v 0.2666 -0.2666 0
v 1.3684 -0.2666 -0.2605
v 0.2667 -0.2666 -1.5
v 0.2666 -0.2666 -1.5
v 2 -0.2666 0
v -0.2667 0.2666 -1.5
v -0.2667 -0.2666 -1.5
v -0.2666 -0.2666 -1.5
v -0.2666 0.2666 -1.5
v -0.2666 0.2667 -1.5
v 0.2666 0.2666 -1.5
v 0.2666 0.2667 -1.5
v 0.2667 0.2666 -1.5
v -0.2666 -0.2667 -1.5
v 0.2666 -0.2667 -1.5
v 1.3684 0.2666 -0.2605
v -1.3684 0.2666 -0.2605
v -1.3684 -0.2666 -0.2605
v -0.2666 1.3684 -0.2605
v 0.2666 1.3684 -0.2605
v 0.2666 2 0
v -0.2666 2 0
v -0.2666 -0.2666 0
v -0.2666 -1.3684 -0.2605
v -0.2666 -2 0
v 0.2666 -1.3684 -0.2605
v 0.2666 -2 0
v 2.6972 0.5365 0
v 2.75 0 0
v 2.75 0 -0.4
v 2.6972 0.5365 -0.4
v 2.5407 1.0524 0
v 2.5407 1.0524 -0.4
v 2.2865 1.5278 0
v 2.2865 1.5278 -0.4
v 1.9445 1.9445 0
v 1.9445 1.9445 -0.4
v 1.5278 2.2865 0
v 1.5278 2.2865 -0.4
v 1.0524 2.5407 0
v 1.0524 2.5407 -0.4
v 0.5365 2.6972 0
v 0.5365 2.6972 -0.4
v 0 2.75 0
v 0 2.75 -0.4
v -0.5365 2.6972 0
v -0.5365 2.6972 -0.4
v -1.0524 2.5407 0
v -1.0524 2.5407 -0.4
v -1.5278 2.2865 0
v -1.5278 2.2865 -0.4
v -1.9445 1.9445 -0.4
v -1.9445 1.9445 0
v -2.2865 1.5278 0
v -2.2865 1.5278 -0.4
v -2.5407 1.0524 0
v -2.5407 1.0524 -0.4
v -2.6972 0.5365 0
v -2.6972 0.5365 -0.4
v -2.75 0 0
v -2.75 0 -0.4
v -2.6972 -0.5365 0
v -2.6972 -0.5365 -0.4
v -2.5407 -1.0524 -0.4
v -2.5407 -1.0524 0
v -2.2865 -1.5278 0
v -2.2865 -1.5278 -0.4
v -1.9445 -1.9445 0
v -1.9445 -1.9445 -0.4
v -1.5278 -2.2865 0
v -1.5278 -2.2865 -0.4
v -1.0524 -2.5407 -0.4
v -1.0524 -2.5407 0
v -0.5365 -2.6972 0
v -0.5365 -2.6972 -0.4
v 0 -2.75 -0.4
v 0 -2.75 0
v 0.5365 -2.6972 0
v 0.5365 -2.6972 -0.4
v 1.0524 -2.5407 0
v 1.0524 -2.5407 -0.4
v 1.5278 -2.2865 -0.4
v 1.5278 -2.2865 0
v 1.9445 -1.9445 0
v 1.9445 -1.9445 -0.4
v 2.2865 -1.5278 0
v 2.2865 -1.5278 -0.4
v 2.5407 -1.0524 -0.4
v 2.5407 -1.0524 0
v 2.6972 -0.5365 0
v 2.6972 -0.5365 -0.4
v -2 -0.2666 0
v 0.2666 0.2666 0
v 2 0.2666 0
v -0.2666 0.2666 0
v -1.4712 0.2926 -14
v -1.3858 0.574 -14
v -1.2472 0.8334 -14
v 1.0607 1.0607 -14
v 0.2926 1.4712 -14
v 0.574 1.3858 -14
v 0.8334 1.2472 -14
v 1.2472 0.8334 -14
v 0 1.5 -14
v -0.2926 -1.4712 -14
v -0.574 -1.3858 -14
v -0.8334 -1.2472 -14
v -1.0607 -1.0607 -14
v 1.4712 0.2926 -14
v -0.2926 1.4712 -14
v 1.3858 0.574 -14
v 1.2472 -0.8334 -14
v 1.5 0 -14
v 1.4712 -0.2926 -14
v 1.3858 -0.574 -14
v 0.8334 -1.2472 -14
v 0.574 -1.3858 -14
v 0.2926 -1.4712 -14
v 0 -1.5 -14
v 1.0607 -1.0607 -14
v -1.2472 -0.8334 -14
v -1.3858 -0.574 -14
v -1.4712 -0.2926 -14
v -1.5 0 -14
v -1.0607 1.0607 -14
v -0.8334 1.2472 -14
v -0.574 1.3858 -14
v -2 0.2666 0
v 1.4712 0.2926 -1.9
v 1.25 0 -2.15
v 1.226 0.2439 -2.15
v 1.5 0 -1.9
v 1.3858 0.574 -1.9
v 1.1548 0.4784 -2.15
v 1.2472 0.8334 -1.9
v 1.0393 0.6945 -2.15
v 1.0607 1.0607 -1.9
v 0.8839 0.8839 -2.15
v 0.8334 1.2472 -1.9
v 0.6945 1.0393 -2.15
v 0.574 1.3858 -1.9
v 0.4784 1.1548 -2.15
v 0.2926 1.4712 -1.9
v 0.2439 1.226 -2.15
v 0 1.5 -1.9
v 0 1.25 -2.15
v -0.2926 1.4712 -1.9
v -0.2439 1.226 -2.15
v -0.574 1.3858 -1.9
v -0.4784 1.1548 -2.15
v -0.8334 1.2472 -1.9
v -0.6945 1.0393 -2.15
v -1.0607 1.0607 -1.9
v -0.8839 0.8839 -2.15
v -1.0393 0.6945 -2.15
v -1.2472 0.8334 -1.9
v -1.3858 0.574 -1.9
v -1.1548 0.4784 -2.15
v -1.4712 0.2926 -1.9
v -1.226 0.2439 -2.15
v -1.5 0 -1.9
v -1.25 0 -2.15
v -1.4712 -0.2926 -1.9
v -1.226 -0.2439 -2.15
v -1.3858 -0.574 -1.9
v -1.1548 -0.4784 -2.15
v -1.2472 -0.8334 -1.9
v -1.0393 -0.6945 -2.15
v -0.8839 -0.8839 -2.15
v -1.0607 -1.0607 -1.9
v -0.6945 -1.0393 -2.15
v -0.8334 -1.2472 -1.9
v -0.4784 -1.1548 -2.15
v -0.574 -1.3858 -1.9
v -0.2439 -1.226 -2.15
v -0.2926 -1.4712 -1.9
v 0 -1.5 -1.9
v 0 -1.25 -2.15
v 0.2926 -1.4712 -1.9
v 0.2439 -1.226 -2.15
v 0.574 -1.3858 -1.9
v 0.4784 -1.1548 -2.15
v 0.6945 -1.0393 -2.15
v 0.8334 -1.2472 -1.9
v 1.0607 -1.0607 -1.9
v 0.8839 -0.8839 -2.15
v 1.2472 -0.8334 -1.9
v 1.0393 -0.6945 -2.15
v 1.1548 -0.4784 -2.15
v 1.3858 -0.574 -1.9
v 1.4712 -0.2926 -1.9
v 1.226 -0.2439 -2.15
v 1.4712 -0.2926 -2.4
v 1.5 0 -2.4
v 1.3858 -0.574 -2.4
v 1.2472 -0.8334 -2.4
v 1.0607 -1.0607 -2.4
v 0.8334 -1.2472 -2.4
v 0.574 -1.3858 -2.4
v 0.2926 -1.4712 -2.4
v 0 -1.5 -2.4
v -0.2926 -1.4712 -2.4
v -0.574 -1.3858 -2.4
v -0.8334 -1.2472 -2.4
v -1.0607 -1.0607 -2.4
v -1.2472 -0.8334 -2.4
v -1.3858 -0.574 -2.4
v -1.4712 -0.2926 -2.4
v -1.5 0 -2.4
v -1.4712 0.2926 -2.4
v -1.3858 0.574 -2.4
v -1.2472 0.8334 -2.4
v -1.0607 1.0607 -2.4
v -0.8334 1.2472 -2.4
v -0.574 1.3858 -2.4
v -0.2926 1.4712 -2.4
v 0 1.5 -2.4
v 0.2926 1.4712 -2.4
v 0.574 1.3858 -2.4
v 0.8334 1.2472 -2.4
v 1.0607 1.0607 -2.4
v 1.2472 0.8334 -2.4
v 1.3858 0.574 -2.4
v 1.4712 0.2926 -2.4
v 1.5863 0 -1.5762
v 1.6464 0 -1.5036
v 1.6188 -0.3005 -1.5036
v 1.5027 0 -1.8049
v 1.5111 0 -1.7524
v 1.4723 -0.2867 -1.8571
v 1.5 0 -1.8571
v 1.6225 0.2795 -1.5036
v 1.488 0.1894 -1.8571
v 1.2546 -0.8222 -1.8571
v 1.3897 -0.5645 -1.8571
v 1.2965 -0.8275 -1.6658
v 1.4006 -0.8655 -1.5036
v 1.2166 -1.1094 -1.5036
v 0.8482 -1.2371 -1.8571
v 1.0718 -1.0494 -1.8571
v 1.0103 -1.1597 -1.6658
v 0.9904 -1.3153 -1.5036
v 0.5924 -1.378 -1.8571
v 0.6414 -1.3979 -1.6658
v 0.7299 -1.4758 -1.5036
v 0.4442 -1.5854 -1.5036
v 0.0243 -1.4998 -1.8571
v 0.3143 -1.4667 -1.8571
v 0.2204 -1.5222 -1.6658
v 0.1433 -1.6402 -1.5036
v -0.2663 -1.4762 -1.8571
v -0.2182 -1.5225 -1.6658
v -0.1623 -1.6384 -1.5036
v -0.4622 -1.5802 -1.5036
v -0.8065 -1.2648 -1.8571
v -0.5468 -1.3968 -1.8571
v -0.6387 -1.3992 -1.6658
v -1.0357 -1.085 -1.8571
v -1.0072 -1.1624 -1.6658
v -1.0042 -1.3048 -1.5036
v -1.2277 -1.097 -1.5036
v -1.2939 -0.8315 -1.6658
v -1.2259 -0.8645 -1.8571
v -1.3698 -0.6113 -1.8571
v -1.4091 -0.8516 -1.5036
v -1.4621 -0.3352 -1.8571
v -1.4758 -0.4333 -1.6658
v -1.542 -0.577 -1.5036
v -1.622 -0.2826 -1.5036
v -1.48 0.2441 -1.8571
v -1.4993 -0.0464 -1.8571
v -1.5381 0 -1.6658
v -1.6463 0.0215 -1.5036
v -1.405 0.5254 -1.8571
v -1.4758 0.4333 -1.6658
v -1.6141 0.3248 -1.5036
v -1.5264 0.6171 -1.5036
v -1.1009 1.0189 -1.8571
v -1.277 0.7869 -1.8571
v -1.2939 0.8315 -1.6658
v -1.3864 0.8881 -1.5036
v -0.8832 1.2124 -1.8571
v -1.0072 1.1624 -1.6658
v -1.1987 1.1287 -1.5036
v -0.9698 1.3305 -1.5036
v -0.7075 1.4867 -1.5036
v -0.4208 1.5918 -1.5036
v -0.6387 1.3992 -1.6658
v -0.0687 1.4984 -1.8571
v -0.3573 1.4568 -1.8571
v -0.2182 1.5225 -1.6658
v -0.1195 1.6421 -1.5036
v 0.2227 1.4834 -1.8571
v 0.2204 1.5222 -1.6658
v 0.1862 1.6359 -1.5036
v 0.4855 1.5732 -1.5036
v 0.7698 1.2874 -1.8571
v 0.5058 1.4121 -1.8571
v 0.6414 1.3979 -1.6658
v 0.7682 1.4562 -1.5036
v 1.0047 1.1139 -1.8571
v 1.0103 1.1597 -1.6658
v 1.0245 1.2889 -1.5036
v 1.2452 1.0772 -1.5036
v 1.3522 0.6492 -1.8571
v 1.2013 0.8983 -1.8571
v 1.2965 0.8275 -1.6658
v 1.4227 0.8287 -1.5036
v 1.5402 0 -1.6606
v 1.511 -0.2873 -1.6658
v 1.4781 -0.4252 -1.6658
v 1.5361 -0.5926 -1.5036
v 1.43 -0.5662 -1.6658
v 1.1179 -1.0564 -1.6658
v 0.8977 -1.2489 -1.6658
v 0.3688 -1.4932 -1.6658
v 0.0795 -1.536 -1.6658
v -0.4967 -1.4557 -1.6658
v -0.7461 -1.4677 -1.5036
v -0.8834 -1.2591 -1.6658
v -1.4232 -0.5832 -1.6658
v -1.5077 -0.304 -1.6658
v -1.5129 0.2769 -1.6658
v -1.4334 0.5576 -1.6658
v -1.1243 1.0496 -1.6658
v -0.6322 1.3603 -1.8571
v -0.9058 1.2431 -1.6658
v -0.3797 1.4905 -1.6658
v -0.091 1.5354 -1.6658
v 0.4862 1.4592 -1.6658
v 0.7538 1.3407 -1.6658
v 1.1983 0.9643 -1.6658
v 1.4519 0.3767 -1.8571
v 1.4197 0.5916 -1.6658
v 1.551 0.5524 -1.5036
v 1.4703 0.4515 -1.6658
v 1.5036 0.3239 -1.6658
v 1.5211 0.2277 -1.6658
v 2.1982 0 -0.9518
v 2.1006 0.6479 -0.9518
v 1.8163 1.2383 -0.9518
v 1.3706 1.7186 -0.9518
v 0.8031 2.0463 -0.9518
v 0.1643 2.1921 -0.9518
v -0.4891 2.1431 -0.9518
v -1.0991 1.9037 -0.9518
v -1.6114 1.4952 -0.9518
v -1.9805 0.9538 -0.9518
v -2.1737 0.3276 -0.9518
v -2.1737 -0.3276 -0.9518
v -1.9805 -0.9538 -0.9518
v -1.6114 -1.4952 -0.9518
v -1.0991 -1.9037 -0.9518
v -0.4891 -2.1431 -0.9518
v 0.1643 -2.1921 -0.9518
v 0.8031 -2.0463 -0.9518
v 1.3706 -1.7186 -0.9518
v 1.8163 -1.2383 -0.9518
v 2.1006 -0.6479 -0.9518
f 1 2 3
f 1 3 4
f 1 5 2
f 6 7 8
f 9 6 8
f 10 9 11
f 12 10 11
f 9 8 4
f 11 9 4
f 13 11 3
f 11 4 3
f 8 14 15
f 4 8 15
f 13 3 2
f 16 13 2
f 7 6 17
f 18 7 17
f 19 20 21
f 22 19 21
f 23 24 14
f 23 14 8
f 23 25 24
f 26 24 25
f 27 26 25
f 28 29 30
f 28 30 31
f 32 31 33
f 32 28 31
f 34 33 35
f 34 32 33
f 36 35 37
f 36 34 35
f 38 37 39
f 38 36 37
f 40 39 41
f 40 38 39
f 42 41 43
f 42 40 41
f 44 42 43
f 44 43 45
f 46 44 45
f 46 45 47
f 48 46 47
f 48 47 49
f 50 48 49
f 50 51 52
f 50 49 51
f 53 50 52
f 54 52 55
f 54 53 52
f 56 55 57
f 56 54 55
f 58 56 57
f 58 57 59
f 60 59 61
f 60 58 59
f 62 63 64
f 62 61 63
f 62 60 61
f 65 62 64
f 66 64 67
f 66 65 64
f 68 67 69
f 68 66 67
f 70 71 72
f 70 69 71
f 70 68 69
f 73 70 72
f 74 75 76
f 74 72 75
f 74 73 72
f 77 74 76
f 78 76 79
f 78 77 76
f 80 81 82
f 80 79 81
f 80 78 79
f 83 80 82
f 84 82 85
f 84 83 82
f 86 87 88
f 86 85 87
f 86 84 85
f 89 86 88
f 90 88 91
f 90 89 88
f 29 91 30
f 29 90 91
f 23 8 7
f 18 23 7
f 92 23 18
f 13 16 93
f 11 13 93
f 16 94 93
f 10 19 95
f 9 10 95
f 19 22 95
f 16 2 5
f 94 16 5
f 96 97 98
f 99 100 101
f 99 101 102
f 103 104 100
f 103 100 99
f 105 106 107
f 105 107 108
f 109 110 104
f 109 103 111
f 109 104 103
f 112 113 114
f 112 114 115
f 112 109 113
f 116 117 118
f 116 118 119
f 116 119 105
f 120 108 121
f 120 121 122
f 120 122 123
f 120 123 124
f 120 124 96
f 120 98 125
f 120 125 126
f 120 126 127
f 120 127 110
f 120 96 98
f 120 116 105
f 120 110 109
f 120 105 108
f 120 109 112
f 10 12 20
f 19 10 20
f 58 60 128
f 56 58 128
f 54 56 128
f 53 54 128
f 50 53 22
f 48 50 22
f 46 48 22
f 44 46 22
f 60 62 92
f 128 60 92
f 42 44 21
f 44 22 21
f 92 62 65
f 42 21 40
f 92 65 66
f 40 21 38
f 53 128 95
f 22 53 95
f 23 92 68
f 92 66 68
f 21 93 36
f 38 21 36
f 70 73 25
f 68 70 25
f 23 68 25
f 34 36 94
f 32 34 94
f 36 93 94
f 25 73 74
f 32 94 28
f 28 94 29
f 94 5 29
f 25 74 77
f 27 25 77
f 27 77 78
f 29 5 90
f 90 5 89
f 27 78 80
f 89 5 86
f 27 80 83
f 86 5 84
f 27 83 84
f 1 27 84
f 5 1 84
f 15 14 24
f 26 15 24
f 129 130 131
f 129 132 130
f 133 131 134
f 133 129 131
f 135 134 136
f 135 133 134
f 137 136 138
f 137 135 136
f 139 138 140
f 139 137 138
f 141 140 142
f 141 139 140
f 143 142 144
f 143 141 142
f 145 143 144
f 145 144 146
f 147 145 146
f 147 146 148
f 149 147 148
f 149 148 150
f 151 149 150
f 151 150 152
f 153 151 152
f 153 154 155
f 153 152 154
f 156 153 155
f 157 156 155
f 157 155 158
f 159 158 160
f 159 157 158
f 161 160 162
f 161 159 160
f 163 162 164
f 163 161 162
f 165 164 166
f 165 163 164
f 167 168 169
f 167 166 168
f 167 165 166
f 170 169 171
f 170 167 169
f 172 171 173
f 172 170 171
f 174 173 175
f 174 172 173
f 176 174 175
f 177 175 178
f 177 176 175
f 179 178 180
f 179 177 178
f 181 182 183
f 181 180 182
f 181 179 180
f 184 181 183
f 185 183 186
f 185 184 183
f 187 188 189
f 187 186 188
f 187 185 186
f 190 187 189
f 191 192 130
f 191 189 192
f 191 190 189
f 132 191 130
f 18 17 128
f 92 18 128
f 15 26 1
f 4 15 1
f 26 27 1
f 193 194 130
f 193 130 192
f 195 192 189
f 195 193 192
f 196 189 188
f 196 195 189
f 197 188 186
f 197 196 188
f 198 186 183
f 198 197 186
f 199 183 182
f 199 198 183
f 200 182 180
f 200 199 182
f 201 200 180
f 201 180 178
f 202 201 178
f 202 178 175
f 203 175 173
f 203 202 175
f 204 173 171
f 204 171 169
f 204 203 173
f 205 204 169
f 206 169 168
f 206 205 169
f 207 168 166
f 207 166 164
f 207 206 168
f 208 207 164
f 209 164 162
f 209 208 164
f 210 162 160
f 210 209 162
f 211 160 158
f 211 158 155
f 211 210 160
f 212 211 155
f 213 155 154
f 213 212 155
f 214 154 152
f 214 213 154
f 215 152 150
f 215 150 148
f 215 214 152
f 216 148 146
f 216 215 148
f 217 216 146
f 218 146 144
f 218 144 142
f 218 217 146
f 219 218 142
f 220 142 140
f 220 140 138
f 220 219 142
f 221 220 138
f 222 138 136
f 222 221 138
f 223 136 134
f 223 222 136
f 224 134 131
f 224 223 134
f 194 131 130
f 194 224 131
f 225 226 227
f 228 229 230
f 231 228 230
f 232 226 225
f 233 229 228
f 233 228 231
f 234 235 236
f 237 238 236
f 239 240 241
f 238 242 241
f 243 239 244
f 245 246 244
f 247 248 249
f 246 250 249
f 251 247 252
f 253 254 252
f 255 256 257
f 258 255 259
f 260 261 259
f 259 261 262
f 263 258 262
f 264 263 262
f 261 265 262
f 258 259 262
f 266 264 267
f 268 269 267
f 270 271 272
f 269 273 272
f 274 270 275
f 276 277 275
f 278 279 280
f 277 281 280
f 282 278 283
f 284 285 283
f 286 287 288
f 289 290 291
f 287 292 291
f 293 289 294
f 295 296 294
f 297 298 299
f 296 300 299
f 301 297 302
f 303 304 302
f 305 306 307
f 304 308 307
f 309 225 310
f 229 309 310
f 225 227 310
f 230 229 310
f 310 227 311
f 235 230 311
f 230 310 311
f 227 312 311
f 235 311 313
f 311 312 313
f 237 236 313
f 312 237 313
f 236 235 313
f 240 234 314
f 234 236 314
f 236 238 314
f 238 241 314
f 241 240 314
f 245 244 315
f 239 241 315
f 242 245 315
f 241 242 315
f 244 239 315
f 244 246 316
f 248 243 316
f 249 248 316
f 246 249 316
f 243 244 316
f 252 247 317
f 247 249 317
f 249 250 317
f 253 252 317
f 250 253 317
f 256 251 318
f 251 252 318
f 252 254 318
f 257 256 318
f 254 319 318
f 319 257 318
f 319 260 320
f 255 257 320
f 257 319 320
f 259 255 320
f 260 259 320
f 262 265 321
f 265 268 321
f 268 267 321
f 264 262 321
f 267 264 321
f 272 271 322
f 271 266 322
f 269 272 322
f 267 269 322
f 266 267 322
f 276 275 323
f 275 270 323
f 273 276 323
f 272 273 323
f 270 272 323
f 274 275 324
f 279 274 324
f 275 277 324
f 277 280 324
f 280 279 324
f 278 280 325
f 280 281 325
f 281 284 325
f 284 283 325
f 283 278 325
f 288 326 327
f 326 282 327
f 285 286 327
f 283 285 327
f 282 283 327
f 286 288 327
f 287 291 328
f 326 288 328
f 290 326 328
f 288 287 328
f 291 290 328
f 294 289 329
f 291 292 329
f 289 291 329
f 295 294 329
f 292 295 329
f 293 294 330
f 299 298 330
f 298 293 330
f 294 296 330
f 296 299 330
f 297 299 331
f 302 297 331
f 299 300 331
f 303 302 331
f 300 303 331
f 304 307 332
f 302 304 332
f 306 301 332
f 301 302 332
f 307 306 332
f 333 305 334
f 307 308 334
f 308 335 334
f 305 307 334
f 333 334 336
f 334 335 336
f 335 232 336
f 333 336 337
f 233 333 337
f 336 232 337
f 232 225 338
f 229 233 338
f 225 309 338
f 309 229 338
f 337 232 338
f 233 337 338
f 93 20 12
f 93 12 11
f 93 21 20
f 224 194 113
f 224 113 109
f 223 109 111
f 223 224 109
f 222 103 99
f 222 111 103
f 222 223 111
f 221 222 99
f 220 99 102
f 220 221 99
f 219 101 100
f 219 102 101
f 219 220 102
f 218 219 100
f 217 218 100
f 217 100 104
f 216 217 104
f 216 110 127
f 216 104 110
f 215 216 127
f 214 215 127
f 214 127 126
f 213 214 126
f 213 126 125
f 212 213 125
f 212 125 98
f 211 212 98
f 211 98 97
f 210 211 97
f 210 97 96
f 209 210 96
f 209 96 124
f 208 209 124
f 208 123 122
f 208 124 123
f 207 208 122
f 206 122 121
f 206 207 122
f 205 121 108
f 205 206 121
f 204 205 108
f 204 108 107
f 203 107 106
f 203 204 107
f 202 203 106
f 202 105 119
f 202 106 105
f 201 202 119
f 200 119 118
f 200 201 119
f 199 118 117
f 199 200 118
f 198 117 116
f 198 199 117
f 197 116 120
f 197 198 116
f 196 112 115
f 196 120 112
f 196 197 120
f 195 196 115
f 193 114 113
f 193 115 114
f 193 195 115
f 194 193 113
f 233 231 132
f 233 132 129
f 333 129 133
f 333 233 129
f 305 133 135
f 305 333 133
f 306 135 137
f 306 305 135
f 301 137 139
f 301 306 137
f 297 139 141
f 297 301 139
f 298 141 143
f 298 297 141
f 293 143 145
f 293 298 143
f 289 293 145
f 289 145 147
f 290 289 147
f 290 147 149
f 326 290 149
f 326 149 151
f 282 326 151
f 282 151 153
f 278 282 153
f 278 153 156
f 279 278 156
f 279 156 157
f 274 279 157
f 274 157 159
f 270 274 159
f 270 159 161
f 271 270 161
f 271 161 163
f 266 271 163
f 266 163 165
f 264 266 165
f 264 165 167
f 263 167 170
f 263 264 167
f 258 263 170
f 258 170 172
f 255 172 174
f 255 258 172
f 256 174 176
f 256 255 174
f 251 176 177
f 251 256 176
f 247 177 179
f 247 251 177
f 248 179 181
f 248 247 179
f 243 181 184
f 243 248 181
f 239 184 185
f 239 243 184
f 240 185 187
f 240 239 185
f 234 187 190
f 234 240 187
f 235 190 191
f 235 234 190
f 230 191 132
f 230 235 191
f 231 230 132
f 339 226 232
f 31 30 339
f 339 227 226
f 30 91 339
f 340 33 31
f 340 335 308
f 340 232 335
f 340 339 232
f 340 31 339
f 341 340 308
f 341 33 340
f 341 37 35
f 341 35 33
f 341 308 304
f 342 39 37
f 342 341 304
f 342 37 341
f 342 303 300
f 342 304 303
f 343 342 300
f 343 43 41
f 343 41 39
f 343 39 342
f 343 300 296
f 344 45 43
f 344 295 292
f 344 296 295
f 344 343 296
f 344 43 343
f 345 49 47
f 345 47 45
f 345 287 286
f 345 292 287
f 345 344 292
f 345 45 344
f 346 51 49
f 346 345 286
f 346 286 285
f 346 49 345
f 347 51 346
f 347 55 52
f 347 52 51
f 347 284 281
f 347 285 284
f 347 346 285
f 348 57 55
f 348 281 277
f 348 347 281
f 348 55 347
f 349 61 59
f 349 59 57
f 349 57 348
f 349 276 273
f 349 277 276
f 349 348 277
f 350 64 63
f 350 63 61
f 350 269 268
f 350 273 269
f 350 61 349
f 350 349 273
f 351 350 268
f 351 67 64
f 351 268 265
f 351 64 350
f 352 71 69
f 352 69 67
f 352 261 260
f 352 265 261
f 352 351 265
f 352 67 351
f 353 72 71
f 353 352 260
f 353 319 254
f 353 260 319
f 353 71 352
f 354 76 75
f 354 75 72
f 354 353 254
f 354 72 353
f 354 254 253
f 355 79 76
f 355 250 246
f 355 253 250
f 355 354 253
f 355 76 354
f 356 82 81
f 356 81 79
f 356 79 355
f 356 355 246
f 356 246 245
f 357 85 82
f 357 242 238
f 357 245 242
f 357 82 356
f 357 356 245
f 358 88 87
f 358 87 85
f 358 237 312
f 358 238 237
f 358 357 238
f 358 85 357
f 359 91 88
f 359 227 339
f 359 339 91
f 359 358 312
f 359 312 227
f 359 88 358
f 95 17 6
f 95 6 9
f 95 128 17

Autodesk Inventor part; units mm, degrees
ref_plane "YZ Plane" through (0, 0, 0) normal (1, 0, 0) x (0, 1, 0)
sketch "Esquisse1" plane through (0, 0, 0) normal (0, 1, 0) x (-1, 0, 0)
  point P0 (0, 0)
sketch "Esquisse2" plane through (0, 0, 0) normal (0, 0, 1) x (1, 0, 0)
  point P0 (0, 0)
sketch "Esquisse3" plane through (0, 0, 0) normal (0, 0, 1) x (1, 0, 0)
  point P0 (0, 0)
sketch "Esquisse4" plane through (0, 0, 0) normal (0, 1, 0) x (-1, 0, 0)
  line L0 (-2.75, 0) -> (0, 0)
  line L1 (-2.75, -0.4) -> (-2.75, 0)
  line L2 (-1.5, -1.65) -> (-2.75, -0.4)
  line L3 (-1.5, -1.9) -> (-1.5, -1.65)
  line L4 (-1.25, -2.15) -> (-1.5, -1.9)
  line L5 (-1.5, -2.4) -> (-1.25, -2.15)
  line L6 (-1.5, -14) -> (-1.5, -2.4)
  line L7 (0, 0) -> (0, -14)
  line L8 (0, 3.3392) -> (0, -10.7) construction
  line L9 (0, 3.3392) -> (0, -10.7)
  line L10 (0, -17.4678) -> (0, 6.8071) projected
  line L11 (-1.5, -14) -> (0, -14)
  line L12 (0.55, 0) -> (-3.3, 0) projected
  dimension "d3" = 2.75
  dimension "d5" = 0.25
  dimension "d7" = 0.25
  dimension "d9" = 0.25
  dimension "d11" = 1.65
  dimension "d13" = 135
  dimension "d17" = 1.25
  dimension "d19" = 0
  dimension "d51" = 1.5
  dimension "d52" = 14
revolve "Révolution1" add sketch "Esquisse4" angle 360 about axis through (0, 0, 3.3392) along (0, 0, -1)
sketch "Esquisse5" plane through (0, 0, 0) normal (0, 1, 0) x (-1, 0, 0)
  line L0 (-1.6, 0) -> (0, 0)
  line L1 (-0.2667, -1.5) -> (-1.6, 0)
  line L2 (0, -1.5) -> (-0.2667, -1.5)
  line L3 (0, 0) -> (0, -1.5)
  line L4 (-1.5, -1.65) -> (1.5, -1.65) construction
  line L5 (-2.75, 0) -> (2.75, 0) projected
  line L6 (0, -1.98) -> (0, 0.33) projected
  dimension "d22" = 1.6
  dimension "d24" = 0.2667
  dimension "d26" = 1.5
extrude "Extrusion1" cut sketch "Esquisse5" along normal mid plane 0.5333
pattern_circular "RéseauPolaire1" count 4 over 360 about axis through (0, 0, 0) along (0, 0, 1) of "Extrusion1"
sketch "Esquisse7" plane through (0, 0, 0) normal (0, 1, 0) x (-1, 0, 0)
  line L0 (0, -0.825) -> (-2, 0)
  line L1 (0, 0) -> (0, -0.825)
  line L2 (-2, 0) -> (0, 0)
  line L3 (-1.5, -1.65) -> (1.5, -1.65) construction
  line L4 (0, -1.98) -> (0, 0.33) projected
  line L5 (-2.75, 0) -> (2.75, 0) projected
  dimension "d33" = 2
  dimension "d35" = 0.825
extrude "Extrusion2" cut sketch "Esquisse7" along normal mid plane 0.5333
pattern_circular "RéseauPolaire2" count 4 over 360 about axis through (0, 0, 0) along (0, 0, 1) of "Extrusion2"
fillet "Congé1" radius 0.5 1 edges at (-1.5, 0, -1.65)
thread "Filetage1" size "M3x0.5" class "6g" standard "ISO Metric profile" full length
ref_plane "MSC_PF1" through (0, 0, 0) normal (1, 0, 0) x (0, 1, 0)
ref_plane "MSC_PT1" through (0, 0, 0) normal (0, 0, -1) x (-1, 0, 0)
equation "\"d3\" = 0.5 * Dh"
equation "\"d5\" = msp_x"
equation "\"d7\" = ParA"
equation "\"d9\" = msp_x"
equation "\"d11\" = ParK"
equation "\"d17\" = 0.5 * msp_mdtds"
equation "\"d51\" = 0.5 * NND"
equation "\"d52\" = NLG"
equation "\"d22\" = 0.5 * M"
equation "\"d24\" = 0.0833333 * M"
equation "\"d26\" = 0.909091 * ParK"
equation "\"d27\" = 0.166667 * M"
equation "\"d33\" = 0.625 * M"
equation "\"d35\" = 0.5 * ParK"
equation "\"d36\" = 0.166667 * M"
equation "\"d41\" = 2 * msp_x"
equation "\"PTC\" = 0.5"
equation "\"NLG\" = 14"
equation "\"ParK\" = 1.65"
equation "\"NND\" = 3"
equation "\"M\" = 3.2"
equation "\"msp_mdtds\" = NND - PTC"
equation "\"Dh\" = 5.5"
equation "\"msp_x\" = 0.5 * PTC"
equation "\"ParA\" = 0.5 * PTC"
equation "\"r\" = 0.8"
equation "\"THREADDIA\" = NND"
equation "\"TEMPLATE\" = 1.2345"
properties part number "NF EN ISO 7046-2 H - M3x14 - 8.8 - H1" material "Acier inoxydable 440C"
